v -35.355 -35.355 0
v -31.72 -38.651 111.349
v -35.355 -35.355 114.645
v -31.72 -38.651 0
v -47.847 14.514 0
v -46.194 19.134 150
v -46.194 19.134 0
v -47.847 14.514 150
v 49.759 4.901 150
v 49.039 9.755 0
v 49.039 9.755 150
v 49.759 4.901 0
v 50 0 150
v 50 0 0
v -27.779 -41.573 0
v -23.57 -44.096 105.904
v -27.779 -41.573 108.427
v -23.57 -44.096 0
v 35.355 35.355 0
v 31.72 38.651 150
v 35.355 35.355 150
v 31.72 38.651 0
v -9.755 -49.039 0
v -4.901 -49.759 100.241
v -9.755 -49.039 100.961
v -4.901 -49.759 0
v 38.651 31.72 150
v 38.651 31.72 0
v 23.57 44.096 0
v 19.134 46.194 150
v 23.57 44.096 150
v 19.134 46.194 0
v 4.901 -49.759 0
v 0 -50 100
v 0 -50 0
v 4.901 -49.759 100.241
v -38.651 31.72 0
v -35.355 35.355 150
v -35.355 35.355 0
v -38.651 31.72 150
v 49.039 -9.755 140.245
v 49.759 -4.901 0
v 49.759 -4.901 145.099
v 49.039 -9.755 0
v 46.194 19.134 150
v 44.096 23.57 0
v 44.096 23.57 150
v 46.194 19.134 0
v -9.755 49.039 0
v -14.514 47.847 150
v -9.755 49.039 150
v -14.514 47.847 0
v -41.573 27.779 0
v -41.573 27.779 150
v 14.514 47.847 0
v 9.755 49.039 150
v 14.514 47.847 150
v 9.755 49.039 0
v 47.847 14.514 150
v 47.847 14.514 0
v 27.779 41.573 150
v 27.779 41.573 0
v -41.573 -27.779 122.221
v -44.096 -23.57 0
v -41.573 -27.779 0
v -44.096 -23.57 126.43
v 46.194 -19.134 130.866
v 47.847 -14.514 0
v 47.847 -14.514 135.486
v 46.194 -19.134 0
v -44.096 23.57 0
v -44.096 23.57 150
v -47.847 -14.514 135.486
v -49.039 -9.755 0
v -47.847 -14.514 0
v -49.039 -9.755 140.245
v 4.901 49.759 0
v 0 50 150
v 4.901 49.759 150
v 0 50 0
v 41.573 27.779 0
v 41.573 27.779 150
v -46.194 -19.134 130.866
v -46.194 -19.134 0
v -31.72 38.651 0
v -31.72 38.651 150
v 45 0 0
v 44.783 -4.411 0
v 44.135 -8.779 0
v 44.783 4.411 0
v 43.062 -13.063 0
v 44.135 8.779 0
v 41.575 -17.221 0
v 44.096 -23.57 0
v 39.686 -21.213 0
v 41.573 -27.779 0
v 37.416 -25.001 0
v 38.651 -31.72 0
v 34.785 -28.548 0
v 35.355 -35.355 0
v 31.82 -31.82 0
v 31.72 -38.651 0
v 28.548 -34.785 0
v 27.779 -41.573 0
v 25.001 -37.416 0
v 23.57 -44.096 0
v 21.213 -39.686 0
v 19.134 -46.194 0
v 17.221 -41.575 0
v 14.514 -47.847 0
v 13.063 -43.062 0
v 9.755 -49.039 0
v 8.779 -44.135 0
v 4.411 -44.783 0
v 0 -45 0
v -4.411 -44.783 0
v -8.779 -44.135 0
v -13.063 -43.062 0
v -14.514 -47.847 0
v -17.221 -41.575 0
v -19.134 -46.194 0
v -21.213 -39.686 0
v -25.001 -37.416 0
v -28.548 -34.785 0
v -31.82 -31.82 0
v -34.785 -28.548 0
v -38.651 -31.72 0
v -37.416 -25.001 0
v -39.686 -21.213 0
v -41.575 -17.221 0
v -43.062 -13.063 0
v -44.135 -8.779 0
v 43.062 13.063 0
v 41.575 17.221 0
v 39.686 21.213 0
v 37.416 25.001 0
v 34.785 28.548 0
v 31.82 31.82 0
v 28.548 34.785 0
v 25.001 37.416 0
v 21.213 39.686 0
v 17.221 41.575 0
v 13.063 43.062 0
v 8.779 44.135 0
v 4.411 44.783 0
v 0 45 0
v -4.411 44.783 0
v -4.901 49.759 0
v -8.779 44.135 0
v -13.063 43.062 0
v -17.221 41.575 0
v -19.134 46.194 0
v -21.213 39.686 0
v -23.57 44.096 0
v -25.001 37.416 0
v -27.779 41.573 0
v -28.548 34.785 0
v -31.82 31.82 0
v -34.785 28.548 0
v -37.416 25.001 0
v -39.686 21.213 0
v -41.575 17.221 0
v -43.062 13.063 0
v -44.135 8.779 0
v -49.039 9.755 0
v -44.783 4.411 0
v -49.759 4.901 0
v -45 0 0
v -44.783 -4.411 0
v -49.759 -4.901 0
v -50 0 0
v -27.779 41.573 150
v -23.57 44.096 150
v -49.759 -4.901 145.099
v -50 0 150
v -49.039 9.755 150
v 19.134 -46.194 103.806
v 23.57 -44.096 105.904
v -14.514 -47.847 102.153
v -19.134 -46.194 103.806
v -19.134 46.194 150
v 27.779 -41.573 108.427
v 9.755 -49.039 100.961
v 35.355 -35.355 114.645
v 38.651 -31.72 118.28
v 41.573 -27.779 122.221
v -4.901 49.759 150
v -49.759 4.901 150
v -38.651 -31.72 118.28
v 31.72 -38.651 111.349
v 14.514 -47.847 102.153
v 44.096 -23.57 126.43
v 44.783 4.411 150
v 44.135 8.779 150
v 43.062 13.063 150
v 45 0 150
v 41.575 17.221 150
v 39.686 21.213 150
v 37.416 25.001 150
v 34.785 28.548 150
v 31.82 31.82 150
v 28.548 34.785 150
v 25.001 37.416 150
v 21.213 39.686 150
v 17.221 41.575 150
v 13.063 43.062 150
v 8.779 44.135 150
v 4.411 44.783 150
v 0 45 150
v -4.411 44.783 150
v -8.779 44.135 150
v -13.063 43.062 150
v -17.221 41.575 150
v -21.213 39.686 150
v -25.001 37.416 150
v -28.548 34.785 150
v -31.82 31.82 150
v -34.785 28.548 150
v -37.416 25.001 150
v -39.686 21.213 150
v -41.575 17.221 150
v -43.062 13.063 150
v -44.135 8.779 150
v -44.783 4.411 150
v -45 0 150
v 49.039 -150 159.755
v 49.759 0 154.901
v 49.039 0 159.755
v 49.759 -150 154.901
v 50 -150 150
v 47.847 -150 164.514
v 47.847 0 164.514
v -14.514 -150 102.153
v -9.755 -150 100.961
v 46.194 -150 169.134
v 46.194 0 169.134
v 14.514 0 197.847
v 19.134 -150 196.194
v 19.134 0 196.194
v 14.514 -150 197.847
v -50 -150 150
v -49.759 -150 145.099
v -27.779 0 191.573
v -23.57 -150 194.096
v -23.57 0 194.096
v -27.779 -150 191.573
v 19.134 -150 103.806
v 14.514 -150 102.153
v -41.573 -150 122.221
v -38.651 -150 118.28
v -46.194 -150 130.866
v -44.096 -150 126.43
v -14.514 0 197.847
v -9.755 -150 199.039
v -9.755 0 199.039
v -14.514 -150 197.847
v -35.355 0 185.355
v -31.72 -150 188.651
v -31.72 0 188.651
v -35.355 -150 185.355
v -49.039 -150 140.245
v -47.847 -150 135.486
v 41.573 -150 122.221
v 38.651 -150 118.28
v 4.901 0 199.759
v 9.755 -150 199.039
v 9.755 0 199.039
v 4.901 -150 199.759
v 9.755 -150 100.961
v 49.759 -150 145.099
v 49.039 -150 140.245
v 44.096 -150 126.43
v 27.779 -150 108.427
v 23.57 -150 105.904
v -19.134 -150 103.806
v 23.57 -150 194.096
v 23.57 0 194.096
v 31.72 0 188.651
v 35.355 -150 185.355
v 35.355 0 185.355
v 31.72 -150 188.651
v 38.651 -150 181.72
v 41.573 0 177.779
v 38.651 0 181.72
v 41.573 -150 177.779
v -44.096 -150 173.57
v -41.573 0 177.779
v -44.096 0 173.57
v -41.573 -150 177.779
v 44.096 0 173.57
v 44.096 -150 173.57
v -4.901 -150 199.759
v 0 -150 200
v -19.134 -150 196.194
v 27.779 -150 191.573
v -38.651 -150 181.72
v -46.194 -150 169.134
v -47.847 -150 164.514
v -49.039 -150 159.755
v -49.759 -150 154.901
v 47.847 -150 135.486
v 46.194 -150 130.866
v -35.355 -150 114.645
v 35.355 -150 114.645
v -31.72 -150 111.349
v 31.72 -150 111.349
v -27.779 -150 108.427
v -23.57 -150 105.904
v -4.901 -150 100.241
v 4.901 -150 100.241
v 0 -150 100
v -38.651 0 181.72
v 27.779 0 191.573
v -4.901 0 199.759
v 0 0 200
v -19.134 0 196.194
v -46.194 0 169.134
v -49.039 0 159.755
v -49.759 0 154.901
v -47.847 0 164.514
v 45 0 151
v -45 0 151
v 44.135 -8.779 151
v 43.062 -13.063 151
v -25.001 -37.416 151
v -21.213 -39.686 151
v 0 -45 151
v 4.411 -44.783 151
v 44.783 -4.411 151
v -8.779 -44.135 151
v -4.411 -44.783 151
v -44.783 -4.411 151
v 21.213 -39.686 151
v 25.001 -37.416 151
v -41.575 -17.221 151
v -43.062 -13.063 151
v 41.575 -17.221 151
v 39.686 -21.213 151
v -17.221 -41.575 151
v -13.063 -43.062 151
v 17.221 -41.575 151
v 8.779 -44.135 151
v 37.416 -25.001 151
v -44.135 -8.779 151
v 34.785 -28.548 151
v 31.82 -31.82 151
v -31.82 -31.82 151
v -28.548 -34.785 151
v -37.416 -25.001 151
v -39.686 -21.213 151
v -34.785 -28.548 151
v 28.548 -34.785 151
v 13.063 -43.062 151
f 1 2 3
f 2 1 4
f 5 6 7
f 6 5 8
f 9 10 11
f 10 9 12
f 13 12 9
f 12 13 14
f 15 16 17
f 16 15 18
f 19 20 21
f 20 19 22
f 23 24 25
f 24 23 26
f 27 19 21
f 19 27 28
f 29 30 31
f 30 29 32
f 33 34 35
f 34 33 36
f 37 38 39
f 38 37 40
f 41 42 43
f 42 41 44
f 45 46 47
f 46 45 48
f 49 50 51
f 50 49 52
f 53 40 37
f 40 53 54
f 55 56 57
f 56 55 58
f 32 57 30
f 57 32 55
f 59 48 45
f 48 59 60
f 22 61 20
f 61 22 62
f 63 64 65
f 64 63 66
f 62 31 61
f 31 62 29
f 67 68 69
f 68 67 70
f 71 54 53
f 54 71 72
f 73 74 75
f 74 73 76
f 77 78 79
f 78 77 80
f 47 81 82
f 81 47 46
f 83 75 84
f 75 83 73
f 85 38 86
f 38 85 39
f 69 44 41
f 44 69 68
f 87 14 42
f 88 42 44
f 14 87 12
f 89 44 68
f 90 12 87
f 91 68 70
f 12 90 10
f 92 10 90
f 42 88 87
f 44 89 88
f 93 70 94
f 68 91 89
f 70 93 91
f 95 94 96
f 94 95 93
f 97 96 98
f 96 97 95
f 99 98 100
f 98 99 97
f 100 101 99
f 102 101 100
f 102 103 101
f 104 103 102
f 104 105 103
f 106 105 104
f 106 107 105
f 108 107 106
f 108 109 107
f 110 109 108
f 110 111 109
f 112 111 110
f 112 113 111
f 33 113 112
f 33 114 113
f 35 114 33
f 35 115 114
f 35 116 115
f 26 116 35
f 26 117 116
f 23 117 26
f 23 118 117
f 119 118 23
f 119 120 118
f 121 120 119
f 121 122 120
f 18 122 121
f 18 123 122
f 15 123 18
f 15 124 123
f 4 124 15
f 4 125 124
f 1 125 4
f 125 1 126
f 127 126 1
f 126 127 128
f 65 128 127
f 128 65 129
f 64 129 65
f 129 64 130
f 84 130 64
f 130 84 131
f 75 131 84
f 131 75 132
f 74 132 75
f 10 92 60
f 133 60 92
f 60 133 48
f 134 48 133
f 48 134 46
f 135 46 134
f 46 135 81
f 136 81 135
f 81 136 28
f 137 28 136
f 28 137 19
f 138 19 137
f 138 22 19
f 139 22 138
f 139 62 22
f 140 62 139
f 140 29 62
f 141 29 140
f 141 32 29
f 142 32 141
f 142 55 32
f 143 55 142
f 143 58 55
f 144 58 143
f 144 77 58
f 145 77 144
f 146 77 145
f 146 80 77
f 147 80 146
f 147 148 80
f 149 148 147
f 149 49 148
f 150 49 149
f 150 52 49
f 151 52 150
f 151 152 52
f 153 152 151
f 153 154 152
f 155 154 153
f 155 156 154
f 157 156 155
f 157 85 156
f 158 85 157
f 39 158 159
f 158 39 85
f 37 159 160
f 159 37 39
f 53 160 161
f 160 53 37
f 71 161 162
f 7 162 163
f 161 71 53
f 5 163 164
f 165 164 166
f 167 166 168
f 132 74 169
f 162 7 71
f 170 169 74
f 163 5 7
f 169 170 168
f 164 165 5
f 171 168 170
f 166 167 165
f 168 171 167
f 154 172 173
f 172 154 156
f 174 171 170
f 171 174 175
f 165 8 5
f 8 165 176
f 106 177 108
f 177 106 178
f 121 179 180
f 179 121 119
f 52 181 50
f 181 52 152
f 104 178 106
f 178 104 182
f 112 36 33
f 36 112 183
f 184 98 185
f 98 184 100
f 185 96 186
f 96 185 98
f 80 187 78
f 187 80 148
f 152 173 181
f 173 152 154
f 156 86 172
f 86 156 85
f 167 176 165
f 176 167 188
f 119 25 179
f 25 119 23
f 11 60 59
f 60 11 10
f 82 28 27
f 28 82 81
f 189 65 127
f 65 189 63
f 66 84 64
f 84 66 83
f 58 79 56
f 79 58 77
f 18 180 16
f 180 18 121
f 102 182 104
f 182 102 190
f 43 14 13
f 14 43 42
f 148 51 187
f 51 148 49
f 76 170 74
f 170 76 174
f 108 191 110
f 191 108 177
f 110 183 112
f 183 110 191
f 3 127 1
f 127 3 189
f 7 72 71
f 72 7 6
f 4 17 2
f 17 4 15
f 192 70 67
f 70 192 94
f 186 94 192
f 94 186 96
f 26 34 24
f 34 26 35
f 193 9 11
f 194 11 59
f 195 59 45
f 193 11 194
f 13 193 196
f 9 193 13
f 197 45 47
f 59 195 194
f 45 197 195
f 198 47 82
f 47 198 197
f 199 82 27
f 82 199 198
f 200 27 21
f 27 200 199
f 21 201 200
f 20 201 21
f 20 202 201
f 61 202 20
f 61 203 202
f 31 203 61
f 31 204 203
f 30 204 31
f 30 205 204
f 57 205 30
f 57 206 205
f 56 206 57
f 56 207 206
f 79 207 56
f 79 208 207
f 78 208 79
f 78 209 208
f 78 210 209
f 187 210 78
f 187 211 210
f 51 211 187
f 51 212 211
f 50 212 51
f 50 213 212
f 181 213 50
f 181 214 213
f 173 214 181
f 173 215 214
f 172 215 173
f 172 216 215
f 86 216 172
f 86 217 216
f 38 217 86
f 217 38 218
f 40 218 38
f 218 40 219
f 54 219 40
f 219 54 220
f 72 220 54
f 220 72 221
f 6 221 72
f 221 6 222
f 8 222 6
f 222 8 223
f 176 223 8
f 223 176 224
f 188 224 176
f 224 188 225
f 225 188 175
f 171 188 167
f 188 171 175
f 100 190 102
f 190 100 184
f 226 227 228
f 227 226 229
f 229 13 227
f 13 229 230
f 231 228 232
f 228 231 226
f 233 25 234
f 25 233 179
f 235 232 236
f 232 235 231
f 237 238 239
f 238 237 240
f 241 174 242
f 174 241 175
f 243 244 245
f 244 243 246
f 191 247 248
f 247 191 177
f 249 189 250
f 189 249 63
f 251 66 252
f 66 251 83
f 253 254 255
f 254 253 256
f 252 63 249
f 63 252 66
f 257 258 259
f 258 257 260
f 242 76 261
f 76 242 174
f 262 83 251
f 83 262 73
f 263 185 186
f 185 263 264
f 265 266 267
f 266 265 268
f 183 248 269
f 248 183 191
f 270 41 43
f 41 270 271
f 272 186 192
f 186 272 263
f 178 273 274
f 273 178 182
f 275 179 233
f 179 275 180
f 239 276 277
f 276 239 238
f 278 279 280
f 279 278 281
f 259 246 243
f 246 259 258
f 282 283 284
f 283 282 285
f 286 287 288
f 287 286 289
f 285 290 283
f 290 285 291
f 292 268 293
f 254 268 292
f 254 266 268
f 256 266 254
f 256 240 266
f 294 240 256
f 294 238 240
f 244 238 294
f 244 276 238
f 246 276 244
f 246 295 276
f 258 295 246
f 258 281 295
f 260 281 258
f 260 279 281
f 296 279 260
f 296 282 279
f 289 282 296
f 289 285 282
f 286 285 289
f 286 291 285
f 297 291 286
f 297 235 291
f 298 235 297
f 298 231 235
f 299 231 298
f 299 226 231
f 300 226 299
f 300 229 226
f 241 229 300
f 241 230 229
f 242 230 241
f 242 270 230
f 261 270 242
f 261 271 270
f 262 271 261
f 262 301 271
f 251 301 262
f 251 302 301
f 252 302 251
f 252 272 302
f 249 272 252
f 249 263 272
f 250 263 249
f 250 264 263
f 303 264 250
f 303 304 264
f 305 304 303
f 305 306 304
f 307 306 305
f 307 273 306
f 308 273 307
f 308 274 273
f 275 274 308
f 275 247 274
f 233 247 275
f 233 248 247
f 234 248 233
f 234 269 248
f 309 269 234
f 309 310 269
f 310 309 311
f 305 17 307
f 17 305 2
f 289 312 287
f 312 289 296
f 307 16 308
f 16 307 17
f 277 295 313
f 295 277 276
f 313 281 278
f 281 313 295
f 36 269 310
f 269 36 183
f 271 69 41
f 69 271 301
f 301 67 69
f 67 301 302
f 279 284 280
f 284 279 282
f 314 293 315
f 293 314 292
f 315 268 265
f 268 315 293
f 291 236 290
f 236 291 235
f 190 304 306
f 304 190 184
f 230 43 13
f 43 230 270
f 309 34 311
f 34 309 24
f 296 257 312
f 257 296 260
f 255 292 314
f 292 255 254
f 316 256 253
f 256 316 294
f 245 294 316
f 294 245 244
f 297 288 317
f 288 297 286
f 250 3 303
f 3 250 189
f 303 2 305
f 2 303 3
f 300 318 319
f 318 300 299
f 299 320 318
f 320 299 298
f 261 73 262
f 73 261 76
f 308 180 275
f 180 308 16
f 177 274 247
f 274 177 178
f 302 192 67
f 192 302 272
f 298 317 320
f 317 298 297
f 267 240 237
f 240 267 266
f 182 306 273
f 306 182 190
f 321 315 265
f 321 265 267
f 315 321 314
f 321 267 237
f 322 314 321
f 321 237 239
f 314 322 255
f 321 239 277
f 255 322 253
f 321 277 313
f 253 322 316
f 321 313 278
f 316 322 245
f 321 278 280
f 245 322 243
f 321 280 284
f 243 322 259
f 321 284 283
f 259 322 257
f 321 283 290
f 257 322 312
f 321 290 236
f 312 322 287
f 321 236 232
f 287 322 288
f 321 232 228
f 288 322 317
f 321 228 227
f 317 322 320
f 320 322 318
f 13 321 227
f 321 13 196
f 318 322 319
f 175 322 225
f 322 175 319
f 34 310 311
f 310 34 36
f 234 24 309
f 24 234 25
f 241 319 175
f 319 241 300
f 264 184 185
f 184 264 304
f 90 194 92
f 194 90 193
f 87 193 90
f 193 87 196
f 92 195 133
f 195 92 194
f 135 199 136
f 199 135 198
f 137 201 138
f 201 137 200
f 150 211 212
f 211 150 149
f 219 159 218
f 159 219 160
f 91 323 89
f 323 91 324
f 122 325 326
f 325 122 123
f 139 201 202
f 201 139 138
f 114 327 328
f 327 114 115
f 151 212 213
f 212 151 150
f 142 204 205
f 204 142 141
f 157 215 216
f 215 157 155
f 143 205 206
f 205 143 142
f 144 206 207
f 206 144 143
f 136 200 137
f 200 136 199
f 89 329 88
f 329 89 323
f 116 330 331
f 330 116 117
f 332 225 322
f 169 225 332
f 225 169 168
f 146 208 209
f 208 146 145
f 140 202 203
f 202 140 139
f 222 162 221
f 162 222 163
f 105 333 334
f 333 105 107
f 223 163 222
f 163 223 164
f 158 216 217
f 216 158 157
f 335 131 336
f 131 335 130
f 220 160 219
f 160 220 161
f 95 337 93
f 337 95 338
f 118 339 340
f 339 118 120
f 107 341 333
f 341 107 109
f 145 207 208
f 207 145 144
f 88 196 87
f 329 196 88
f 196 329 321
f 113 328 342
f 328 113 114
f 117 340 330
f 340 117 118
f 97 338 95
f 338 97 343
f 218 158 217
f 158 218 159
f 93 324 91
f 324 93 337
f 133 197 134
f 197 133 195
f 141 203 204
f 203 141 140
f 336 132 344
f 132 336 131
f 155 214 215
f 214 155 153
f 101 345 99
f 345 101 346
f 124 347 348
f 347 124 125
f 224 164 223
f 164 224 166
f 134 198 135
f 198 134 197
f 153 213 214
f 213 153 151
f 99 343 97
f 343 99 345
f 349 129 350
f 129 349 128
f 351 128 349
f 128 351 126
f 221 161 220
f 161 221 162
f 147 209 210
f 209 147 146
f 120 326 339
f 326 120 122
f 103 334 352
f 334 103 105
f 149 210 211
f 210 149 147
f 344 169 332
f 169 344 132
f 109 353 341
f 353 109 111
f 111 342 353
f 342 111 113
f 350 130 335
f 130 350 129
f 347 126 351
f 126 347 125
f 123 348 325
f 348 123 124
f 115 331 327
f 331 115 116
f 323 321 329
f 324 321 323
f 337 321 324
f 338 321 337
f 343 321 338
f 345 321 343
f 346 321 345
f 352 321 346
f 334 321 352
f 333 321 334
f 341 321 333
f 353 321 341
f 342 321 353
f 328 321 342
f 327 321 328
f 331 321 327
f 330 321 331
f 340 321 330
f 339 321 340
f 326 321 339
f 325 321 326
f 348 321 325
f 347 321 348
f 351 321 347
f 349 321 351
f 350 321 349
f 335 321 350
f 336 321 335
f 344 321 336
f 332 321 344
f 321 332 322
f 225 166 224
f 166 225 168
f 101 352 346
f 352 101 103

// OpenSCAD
module ht_90_pipe() {
    difference() {
        union() {
            cylinder(h=150, r=50, $fn=64);
            translate([0, 0, 150])
                rotate([90, 0, 0])
                cylinder(h=150, r=50, $fn=64);
        }
        translate([0, 0, -1])
            cylinder(h=152, r=45, $fn=64);
    }
}

ht_90_pipe();
